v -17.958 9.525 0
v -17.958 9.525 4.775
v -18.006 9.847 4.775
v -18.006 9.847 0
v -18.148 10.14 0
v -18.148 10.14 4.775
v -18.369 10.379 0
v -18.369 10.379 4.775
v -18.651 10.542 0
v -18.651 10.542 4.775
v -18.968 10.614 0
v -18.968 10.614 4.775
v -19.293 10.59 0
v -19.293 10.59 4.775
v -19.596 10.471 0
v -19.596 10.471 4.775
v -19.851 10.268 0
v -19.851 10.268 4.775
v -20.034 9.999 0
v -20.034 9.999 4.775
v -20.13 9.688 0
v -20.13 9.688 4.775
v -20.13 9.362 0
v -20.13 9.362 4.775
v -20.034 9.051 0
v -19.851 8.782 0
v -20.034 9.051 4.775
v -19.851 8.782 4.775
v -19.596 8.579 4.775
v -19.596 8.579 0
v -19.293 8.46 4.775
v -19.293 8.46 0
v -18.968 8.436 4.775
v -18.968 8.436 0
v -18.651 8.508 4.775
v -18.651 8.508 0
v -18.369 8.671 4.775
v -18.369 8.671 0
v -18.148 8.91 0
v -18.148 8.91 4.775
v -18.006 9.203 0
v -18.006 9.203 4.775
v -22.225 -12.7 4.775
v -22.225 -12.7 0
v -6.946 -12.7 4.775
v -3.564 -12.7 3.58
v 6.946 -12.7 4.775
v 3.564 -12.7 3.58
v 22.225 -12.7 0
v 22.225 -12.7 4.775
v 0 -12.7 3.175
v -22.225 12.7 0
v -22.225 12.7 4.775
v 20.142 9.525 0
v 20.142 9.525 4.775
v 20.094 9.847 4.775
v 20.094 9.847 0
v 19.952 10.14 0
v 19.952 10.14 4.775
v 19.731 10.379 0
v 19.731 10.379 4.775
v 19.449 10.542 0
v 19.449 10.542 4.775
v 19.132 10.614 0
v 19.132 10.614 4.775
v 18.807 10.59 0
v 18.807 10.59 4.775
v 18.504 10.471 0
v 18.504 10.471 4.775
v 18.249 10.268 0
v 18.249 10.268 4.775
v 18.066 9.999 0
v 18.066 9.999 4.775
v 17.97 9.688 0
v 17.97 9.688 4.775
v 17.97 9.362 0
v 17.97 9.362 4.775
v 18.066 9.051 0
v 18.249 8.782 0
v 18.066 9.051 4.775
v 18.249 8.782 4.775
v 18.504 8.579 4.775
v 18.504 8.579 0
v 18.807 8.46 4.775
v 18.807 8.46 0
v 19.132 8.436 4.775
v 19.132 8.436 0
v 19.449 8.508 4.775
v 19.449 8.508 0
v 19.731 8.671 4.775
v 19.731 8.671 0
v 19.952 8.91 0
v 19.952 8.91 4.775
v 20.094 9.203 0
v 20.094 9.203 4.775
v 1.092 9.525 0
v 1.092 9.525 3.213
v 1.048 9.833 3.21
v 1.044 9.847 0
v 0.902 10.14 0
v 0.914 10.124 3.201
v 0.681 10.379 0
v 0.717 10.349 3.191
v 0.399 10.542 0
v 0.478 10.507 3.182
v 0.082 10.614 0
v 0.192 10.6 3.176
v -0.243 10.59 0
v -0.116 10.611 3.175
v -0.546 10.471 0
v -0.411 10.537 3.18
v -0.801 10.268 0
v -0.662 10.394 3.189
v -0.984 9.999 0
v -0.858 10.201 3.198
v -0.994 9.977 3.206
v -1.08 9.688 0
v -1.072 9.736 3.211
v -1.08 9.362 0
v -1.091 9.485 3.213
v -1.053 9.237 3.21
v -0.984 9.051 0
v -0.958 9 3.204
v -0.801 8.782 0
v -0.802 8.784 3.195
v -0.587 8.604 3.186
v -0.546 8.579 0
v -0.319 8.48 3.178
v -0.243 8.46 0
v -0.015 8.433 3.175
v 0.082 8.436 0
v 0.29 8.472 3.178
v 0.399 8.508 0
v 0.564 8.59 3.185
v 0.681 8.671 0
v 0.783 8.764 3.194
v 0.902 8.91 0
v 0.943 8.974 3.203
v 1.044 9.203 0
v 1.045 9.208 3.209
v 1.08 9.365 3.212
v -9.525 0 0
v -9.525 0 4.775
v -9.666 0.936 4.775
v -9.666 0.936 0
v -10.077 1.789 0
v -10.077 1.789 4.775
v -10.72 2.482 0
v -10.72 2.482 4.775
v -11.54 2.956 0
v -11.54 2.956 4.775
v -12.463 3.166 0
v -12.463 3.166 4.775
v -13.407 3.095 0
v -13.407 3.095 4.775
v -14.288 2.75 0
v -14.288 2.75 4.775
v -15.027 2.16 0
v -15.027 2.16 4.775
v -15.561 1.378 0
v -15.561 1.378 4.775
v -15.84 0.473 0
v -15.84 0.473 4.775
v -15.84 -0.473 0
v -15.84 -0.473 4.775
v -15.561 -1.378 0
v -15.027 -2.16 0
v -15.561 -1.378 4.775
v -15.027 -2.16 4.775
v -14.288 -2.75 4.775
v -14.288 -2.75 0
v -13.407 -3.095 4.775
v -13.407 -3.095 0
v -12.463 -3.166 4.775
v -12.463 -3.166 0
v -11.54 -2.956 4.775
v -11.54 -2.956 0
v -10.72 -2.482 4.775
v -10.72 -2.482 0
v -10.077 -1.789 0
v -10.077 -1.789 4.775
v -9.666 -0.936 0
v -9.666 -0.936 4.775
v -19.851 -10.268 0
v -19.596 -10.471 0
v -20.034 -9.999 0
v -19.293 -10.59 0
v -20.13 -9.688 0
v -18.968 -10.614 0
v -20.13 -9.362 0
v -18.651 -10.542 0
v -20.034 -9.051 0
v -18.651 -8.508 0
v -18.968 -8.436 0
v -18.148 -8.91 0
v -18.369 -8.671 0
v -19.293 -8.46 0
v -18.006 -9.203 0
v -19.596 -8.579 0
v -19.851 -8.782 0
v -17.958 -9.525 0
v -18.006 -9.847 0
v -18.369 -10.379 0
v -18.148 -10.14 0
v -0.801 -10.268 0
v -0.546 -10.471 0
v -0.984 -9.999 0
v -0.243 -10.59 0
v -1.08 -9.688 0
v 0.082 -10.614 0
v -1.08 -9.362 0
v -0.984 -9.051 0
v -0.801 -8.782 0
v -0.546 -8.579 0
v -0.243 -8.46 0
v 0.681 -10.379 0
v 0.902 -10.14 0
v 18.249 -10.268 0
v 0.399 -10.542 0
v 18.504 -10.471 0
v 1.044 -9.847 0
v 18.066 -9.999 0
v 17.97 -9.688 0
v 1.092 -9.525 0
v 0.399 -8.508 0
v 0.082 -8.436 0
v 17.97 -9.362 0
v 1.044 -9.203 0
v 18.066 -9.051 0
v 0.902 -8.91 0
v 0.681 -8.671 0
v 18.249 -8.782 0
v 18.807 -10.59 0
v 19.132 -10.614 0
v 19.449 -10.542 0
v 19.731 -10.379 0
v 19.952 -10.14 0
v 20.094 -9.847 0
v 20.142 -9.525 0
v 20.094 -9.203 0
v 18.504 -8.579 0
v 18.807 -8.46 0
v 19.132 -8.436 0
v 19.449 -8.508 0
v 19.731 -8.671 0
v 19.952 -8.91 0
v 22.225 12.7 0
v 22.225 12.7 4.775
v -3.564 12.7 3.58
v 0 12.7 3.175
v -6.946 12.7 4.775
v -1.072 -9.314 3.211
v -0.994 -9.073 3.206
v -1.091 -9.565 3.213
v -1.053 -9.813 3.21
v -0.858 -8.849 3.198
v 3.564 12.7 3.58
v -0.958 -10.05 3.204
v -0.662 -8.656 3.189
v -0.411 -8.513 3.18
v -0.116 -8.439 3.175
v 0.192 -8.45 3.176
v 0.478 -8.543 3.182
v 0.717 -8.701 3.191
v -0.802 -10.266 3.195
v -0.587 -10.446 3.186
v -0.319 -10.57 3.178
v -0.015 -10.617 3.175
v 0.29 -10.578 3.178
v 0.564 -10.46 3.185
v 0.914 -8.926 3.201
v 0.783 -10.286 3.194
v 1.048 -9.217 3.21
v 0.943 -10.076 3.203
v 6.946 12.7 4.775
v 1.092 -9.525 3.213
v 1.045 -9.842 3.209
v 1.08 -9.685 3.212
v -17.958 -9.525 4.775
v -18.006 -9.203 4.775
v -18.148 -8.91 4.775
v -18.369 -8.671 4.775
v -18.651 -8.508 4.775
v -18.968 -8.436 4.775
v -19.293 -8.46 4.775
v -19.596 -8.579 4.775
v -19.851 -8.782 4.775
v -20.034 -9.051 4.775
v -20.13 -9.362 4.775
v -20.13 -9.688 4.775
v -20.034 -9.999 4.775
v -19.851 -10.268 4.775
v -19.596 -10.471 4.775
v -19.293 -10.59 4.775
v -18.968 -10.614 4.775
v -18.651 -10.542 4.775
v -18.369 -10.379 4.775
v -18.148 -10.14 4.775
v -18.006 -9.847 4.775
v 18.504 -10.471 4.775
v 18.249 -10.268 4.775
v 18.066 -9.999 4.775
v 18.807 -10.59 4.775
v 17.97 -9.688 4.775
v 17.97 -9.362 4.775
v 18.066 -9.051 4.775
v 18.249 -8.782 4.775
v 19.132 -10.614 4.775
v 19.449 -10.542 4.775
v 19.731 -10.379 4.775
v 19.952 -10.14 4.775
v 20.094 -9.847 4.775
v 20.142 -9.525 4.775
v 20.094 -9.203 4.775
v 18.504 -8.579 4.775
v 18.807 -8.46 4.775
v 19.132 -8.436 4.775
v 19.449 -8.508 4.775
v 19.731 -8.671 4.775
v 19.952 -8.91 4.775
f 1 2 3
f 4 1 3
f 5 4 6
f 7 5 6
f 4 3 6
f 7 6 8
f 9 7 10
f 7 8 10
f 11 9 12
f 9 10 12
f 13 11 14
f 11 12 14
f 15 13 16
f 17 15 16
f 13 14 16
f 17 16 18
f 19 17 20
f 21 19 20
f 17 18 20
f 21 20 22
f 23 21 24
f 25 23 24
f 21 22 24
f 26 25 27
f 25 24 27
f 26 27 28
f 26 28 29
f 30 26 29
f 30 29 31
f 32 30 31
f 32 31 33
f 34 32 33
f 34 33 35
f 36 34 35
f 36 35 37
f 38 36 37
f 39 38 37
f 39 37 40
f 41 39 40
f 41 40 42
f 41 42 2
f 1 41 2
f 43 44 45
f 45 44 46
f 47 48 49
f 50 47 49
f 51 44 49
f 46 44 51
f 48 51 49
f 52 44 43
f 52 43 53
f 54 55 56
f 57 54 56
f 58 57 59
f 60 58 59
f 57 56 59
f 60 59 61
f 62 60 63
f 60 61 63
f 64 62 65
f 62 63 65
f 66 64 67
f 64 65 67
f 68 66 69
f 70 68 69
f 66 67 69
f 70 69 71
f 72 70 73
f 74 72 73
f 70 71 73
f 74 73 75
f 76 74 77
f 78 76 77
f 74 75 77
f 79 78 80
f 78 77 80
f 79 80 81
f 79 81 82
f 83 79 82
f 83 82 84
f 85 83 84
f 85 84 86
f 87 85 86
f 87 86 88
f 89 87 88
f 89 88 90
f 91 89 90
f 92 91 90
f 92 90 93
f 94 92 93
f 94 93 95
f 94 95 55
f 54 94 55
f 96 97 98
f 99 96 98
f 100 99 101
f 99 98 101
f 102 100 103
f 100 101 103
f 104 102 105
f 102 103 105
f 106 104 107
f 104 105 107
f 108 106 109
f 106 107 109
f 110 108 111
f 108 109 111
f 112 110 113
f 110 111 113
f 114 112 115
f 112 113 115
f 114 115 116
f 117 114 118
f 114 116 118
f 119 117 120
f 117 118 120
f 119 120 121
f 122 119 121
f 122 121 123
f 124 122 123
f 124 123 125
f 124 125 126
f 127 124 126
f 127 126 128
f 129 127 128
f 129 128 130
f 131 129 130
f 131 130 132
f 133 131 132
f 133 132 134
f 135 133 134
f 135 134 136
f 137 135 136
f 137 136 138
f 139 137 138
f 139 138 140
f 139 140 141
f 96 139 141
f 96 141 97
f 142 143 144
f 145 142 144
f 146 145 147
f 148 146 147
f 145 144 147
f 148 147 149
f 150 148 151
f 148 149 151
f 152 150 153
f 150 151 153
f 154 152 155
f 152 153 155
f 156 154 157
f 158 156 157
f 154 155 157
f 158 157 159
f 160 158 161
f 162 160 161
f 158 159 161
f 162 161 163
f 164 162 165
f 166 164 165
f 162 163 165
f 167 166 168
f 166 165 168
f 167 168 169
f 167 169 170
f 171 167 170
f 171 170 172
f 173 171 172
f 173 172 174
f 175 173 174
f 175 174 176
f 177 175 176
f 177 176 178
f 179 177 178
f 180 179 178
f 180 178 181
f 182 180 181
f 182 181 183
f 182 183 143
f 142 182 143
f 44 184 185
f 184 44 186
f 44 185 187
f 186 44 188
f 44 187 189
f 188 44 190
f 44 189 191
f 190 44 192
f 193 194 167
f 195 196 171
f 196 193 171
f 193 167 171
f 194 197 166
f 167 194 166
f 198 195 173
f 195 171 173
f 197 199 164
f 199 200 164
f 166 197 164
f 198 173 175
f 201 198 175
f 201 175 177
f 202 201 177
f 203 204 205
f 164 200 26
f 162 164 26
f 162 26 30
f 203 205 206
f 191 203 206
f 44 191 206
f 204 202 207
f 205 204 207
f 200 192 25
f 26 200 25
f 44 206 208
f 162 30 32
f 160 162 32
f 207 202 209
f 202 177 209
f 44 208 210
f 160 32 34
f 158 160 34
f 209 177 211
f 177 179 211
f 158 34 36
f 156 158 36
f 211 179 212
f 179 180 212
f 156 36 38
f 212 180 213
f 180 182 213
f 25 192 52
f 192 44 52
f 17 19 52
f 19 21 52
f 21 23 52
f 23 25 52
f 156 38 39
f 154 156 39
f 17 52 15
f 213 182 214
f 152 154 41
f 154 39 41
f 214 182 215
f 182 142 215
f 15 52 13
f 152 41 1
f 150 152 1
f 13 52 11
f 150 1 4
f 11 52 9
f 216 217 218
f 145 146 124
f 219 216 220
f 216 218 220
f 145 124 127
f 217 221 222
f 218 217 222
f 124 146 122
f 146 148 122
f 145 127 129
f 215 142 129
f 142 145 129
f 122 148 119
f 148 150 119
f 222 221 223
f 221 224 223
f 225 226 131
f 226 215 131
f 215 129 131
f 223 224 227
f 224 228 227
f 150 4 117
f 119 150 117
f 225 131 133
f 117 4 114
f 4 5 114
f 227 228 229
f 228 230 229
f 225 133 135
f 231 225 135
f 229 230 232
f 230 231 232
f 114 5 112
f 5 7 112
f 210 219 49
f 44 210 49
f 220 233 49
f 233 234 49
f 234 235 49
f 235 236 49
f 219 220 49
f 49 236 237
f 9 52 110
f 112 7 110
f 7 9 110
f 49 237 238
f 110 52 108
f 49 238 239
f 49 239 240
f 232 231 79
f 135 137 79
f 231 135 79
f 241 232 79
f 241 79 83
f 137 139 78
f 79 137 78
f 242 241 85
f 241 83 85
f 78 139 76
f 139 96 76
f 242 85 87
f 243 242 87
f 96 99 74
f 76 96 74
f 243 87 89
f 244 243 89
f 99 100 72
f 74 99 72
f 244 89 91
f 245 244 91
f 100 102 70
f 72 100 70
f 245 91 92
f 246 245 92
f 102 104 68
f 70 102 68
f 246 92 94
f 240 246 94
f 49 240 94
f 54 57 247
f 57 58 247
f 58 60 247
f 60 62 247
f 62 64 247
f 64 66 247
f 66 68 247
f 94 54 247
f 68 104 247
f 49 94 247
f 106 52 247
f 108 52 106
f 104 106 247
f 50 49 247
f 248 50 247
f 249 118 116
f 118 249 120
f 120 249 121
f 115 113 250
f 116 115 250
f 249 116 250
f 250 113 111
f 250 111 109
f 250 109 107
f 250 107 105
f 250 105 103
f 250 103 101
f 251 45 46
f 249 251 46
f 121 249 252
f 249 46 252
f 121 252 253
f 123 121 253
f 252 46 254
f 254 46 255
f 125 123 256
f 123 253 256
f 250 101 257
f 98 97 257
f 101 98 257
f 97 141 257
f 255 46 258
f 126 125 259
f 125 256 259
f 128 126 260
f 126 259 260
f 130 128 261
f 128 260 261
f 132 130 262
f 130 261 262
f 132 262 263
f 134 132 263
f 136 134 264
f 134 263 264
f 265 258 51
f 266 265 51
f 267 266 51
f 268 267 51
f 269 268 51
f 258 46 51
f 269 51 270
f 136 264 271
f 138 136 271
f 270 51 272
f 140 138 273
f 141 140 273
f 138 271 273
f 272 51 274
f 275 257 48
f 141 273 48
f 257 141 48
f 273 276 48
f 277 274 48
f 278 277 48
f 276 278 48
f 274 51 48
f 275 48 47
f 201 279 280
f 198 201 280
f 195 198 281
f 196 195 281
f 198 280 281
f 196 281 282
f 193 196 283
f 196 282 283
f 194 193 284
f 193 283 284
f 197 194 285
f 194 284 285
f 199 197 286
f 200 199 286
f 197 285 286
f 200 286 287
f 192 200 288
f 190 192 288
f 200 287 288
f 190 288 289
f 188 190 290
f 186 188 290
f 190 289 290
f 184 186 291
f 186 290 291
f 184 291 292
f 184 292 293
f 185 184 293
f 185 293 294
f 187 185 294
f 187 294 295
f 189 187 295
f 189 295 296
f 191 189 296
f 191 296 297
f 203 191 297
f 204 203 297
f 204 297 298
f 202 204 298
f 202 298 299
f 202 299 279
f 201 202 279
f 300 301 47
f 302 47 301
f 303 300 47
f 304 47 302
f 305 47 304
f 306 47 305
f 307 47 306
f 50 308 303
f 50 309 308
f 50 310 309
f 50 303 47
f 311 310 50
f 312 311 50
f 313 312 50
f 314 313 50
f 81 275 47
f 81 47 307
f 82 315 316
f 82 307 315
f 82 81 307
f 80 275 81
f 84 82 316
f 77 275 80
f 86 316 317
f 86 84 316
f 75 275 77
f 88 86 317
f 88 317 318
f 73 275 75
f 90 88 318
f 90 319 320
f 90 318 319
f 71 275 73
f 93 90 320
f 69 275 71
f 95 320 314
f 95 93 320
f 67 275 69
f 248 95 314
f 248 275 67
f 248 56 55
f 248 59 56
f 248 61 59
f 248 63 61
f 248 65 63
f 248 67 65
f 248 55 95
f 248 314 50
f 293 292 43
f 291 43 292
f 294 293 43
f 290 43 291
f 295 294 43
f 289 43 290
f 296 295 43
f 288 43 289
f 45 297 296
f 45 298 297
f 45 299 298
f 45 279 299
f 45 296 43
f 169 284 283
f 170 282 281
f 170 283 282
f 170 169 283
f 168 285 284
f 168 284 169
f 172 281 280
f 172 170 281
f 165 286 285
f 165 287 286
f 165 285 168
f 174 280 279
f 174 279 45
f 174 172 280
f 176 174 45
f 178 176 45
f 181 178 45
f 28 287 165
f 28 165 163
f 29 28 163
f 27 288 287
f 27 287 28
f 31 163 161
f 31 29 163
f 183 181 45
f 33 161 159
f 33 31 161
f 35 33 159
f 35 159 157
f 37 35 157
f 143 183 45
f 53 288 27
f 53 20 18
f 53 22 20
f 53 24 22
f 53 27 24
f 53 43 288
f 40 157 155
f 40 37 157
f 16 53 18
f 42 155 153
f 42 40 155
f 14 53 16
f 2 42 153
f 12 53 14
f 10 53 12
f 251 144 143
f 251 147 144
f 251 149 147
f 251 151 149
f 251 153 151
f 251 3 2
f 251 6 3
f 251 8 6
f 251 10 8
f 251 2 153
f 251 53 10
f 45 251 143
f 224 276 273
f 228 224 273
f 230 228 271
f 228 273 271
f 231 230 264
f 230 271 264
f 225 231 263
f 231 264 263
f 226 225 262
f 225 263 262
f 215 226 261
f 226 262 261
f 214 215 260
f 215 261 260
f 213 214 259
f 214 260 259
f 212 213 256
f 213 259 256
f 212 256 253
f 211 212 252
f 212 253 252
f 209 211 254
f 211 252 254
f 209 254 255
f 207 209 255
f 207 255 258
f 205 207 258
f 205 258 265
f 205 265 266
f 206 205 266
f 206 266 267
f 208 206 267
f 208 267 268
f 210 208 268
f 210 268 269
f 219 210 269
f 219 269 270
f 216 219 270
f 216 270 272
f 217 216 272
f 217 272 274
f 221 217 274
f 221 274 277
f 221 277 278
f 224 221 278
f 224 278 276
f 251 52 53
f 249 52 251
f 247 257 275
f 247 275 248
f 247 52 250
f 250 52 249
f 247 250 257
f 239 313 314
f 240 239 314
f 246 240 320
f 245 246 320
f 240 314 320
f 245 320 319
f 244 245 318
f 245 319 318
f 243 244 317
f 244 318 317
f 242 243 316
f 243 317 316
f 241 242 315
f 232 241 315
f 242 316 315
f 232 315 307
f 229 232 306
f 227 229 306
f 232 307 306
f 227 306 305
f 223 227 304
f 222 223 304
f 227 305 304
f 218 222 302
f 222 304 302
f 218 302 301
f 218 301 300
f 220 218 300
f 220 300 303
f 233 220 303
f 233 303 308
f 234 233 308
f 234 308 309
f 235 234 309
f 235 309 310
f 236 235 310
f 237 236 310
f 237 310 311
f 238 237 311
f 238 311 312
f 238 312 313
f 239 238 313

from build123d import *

# Parameters (mm, degrees)
F0_W     = 44.45
F0_H     = 25.4
F1_DEPTH = 4.7752
F2_R     = 1.0922
F2_R_2   = 3.175
F3_DEPTH = 4.7762
F4_R     = 15.875
F5_DEPTH = 25.401


with BuildPart() as f1:
    # F0 (on Top) → F1 (new body)
    with BuildSketch(Plane.XY):
        Rectangle(F0_W, F0_H)
    extrude(amount=F1_DEPTH)

    # F2 (on face) → F3 (cut, through all)
    with BuildSketch(Plane.XY.offset(4.7752)):
        with Locations((-19.05, 9.525)):
            Circle(F2_R)
        with Locations((19.05, 9.525)):
            Circle(F2_R)
        with Locations((19.05, -9.525)):
            Circle(F2_R)
        with Locations((-19.05, -9.525)):
            Circle(F2_R)
        with Locations((-12.7, 0)):
            Circle(F2_R_2)
        with Locations((0, 9.525)):
            Circle(F2_R)
        with Locations((0, -9.525)):
            Circle(F2_R)
    extrude(amount=-F3_DEPTH, mode=Mode.SUBTRACT)

    # F4 (on face) → F5 (cut, through all)
    with BuildSketch(Plane.XZ.offset(12.7)):
        with Locations((0, 19.05)):
            Circle(F4_R)
    extrude(amount=-F5_DEPTH, mode=Mode.SUBTRACT)


solid = f1.part
